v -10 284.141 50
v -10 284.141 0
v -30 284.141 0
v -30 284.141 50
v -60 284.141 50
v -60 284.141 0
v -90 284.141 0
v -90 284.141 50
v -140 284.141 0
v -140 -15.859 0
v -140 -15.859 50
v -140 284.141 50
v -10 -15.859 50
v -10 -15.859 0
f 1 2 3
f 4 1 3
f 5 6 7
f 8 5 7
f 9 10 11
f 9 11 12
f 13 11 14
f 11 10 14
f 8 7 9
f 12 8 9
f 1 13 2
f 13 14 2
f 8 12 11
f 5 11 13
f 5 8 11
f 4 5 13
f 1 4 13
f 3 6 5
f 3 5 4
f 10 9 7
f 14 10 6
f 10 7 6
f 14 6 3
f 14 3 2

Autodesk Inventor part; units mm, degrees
ref_plane "YZ Plane" through (0, 0, 0) normal (1, 0, 0) x (0, 1, 0)
ref_plane "XZ Plane" through (0, 0, 0) normal (0, 1, 0) x (-1, 0, 0)
ref_plane "XY Plane" through (0, 0, 0) normal (0, 0, 1) x (1, 0, 0)
ref_plane "Work Plane1" through (0, 0, 0) normal (0, 0, 1) x (1, 0, 0)
sketch "Sketch1" plane through (0, 0, 0) normal (0, 0, 1) x (1, 0, 0)
  line L0 (-60, 284.1414) -> (-30, 284.1414) projected
  line L1 (-10, -149.0271) -> (-140, -149.0271) projected
  line L2 (-10, -149.0271) -> (-10, 350) projected
  spline S0 degree 3 poles (-55.3463, 478.2829) (-54.4199, 477.2402) (-53.5281, 476.1834) (-41.973, 461.9491) (-29.8681, 440.3891) (-13.701, 393.2059) (-10, 371.2252) (-10, 350) knots -13.956375 -13.956375 -13.956375 -13.956375 -13.398469 -13.398469 -6.367551 -6.367551 0 0 0 0 projected
  line L3 (-55.3463, 478.2829) -> (-94.6537, 478.2829) projected
  spline S1 degree 3 poles (-140, 350) (-140, 366.1219) (-137.8703, 382.0269) (-130.4211, 411.7266) (-125.3688, 425.7323) (-111.9139, 454.5302) (-103.4651, 468.0052) (-95.3677, 477.4713) (-95.011, 477.8807) (-94.6537, 478.2829) knots -5.300276 -5.300276 -5.300276 -5.300276 -3.93351 -3.93351 -2.695997 -2.695997 -1.209053 -1.209053 -1.140685 -1.140685 -1.140685 -1.140685 projected
  line L4 (-140, -149.0271) -> (-140, 350) projected
  line L5 (-60, 284.1414) -> (-90, 284.1414) projected
  line L6 (-10, 284.1414) -> (-140, 284.1414)
  line L7 (-140, 284.1414) -> (-140, -15.8586)
  line L8 (-140, -15.8586) -> (-10, -15.8586)
  line L9 (-10, -15.8586) -> (-10, 284.1414)
  point P0 (0, 0)
  point P1 (-10, -15.8586)
  dimension "d0" = 300
extrude "Extrusion1" add sketch "Sketch1" along normal blind 50 contours L0 L6 L2 L8 L4 L5
properties part number "Battery"
